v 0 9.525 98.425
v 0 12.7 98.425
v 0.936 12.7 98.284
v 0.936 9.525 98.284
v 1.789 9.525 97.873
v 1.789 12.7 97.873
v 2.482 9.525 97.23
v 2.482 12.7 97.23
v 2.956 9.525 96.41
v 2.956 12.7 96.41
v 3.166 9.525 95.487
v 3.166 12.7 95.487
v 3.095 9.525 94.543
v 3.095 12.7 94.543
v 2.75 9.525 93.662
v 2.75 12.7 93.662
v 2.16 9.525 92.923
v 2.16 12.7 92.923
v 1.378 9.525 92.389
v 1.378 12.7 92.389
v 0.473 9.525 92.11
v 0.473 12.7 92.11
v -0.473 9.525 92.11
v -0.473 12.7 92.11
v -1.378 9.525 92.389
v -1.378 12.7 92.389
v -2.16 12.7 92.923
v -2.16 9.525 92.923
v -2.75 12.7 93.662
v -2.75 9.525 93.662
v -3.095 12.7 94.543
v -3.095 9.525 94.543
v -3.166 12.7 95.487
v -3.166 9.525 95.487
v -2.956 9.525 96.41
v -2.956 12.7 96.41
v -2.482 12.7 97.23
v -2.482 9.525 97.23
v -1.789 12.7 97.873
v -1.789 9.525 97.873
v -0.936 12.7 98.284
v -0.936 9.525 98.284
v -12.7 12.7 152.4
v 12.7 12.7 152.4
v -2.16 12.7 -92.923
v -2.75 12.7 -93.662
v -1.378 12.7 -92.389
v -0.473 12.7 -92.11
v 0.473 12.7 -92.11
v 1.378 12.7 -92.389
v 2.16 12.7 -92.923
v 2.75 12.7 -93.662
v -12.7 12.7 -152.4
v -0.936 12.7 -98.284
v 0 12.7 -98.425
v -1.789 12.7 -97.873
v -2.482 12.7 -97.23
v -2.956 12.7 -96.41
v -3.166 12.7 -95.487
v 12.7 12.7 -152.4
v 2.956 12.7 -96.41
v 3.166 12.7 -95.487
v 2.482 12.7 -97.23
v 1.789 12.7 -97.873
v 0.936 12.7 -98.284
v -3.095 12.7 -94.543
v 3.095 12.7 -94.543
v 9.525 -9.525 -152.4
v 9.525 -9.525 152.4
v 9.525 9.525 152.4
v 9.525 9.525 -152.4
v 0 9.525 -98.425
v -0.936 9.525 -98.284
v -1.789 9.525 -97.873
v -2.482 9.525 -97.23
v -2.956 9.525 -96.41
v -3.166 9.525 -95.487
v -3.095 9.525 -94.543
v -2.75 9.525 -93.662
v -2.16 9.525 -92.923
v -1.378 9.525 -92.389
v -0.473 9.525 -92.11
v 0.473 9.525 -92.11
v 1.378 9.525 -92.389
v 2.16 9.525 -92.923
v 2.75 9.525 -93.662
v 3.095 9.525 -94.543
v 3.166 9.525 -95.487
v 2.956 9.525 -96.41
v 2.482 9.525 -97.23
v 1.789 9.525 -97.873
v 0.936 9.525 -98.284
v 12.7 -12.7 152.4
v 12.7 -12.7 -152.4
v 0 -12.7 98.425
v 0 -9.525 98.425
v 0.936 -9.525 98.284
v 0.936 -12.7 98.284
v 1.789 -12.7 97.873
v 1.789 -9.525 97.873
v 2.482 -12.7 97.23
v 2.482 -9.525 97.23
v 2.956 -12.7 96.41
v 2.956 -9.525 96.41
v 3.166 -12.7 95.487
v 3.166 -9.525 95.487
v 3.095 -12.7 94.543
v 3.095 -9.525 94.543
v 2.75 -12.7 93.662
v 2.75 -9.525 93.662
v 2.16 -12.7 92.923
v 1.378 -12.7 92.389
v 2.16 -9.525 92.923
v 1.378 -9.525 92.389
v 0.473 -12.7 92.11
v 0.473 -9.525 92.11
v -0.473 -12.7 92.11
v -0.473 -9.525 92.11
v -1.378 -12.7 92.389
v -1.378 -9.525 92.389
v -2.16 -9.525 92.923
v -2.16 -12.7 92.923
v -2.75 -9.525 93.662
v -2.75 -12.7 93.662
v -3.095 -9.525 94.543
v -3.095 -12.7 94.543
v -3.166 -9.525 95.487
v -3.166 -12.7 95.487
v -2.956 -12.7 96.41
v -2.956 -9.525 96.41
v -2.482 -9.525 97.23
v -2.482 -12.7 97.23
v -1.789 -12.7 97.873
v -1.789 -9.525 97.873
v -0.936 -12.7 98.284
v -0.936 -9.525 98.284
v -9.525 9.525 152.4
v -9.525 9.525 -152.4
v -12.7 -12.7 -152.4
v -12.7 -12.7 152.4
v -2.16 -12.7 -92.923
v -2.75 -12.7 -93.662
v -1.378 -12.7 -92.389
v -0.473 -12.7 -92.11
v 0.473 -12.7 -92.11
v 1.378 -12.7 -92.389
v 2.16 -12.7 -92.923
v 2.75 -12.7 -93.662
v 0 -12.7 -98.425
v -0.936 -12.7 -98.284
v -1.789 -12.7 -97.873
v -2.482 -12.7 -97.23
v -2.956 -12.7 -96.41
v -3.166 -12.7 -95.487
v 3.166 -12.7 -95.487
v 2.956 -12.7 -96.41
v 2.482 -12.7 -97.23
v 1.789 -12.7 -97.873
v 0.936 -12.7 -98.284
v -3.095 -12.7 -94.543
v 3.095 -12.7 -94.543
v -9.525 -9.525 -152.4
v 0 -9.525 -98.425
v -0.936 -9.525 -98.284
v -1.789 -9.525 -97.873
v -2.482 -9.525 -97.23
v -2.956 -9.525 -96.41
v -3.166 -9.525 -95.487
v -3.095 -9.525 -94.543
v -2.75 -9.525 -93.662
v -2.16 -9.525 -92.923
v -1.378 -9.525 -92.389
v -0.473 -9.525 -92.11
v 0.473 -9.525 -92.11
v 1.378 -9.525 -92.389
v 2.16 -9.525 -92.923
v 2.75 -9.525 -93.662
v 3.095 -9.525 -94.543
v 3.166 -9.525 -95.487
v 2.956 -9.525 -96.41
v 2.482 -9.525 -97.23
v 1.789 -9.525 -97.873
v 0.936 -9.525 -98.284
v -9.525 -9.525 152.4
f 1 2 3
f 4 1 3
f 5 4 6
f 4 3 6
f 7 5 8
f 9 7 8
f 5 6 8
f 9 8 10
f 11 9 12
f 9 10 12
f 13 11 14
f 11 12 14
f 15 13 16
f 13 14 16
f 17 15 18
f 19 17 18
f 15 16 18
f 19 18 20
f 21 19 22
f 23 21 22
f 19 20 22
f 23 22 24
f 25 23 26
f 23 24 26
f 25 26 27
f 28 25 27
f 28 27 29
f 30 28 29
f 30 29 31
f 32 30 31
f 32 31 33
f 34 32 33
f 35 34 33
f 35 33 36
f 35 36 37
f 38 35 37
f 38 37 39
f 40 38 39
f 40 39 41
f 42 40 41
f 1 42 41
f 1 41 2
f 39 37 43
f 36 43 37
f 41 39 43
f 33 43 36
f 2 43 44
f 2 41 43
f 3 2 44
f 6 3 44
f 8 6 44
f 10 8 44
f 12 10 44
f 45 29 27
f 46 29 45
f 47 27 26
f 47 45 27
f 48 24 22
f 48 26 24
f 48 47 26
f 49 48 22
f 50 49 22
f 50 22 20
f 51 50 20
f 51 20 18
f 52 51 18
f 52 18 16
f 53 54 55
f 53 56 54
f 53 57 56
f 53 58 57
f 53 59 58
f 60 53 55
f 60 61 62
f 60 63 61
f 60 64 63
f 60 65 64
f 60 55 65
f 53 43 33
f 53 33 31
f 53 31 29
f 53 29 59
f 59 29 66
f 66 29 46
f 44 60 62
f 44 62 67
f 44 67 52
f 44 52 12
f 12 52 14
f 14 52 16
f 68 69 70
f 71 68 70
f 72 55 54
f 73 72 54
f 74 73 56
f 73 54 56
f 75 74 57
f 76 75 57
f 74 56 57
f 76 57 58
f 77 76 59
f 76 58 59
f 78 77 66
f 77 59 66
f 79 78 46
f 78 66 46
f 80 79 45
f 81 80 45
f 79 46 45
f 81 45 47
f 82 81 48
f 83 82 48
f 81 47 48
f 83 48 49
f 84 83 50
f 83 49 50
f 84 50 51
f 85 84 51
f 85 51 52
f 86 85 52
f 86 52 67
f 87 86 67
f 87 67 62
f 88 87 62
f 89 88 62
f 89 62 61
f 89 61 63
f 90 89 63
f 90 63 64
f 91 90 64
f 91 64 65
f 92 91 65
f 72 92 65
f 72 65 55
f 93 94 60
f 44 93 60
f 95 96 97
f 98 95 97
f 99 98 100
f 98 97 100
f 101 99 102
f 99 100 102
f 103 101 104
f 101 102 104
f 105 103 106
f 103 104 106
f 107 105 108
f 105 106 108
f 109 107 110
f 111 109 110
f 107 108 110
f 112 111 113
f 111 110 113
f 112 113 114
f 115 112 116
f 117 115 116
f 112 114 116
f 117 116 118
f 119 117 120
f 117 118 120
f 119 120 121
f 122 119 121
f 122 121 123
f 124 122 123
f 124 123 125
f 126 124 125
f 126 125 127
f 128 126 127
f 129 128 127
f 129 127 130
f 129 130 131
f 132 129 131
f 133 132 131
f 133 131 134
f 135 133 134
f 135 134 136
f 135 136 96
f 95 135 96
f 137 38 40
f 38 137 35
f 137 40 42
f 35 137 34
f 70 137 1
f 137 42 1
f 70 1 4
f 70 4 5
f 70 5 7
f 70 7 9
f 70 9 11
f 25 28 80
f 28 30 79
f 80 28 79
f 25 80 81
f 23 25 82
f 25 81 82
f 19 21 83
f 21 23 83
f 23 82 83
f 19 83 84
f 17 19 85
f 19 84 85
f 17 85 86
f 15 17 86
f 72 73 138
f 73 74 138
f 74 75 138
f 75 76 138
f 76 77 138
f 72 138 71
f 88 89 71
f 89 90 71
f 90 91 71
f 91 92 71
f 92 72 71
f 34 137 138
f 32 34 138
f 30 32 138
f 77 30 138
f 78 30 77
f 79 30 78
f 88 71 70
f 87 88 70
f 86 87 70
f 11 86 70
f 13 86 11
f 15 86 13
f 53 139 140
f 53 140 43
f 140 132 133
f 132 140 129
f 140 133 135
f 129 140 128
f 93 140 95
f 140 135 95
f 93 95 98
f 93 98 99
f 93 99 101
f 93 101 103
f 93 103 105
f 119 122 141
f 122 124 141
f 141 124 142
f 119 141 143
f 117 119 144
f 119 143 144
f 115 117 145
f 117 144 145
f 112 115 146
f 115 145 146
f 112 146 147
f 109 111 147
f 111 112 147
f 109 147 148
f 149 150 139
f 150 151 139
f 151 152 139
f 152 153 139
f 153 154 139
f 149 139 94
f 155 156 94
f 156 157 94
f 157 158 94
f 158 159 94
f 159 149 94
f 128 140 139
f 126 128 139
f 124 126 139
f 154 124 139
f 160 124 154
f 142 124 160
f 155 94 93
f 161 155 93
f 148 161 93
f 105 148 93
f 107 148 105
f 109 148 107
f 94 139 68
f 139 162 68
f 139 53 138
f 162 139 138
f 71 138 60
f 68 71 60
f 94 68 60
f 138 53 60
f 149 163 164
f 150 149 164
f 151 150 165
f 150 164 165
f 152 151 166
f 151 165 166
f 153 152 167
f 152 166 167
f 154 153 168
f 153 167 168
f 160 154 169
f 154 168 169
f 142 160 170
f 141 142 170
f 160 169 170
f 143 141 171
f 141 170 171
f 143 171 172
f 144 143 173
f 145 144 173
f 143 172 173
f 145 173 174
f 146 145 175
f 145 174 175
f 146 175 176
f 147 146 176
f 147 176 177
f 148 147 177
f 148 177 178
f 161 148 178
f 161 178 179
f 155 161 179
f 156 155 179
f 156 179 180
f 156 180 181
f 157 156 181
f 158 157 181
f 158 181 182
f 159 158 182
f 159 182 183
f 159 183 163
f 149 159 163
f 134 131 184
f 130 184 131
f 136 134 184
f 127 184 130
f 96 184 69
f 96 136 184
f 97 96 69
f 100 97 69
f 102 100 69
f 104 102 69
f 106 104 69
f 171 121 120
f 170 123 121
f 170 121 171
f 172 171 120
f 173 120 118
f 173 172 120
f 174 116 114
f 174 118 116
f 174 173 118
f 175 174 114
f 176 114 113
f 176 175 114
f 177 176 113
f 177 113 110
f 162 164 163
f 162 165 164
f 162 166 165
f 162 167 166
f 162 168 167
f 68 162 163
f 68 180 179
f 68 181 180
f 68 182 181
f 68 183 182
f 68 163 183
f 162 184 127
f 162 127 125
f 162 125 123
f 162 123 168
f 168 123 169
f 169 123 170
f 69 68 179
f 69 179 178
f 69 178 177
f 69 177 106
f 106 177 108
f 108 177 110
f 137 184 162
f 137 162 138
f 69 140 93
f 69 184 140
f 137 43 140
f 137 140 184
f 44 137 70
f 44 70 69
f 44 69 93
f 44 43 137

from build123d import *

# Parameters (mm, degrees)
BOSS_EXTRUDE1_DEPTH      = 152.4
BOSS_EXTRUDE1_DEPTH_BACK = 152.4
SKETCH3_W                = 25.4
SKETCH3_H                = 25.4
SKETCH3_W_2              = 19.05
SKETCH3_H_2              = 19.05
SKETCH6_R                = 3.175
CUT_EXTRUDE1_DEPTH       = 156.02325632


with BuildPart() as part:
    # Sketch3 → Boss-Extrude1 (new, two sides: drawn at the far end of the back side and taken through both)
    with BuildSketch(Plane.XY.offset(-BOSS_EXTRUDE1_DEPTH_BACK)):
        Rectangle(SKETCH3_W, SKETCH3_H)
        Rectangle(SKETCH3_W_2, SKETCH3_H_2, mode=Mode.SUBTRACT)
    extrude(amount=BOSS_EXTRUDE1_DEPTH + BOSS_EXTRUDE1_DEPTH_BACK)

    # Sketch6 → Cut-Extrude1 (cut, through all)
    with BuildSketch(Plane(origin=(0, 12.7, 0), x_dir=(1, 0, 0), z_dir=(0, 1, 0))):
        with Locations(Location((0, -95.25, 0), (0, 0, 270))):
            Circle(SKETCH6_R)
        with Locations(Location((0, 95.25, 0), (0, 0, 90))):
            Circle(SKETCH6_R)
    extrude(amount=-CUT_EXTRUDE1_DEPTH, mode=Mode.SUBTRACT)


solid = part.part
